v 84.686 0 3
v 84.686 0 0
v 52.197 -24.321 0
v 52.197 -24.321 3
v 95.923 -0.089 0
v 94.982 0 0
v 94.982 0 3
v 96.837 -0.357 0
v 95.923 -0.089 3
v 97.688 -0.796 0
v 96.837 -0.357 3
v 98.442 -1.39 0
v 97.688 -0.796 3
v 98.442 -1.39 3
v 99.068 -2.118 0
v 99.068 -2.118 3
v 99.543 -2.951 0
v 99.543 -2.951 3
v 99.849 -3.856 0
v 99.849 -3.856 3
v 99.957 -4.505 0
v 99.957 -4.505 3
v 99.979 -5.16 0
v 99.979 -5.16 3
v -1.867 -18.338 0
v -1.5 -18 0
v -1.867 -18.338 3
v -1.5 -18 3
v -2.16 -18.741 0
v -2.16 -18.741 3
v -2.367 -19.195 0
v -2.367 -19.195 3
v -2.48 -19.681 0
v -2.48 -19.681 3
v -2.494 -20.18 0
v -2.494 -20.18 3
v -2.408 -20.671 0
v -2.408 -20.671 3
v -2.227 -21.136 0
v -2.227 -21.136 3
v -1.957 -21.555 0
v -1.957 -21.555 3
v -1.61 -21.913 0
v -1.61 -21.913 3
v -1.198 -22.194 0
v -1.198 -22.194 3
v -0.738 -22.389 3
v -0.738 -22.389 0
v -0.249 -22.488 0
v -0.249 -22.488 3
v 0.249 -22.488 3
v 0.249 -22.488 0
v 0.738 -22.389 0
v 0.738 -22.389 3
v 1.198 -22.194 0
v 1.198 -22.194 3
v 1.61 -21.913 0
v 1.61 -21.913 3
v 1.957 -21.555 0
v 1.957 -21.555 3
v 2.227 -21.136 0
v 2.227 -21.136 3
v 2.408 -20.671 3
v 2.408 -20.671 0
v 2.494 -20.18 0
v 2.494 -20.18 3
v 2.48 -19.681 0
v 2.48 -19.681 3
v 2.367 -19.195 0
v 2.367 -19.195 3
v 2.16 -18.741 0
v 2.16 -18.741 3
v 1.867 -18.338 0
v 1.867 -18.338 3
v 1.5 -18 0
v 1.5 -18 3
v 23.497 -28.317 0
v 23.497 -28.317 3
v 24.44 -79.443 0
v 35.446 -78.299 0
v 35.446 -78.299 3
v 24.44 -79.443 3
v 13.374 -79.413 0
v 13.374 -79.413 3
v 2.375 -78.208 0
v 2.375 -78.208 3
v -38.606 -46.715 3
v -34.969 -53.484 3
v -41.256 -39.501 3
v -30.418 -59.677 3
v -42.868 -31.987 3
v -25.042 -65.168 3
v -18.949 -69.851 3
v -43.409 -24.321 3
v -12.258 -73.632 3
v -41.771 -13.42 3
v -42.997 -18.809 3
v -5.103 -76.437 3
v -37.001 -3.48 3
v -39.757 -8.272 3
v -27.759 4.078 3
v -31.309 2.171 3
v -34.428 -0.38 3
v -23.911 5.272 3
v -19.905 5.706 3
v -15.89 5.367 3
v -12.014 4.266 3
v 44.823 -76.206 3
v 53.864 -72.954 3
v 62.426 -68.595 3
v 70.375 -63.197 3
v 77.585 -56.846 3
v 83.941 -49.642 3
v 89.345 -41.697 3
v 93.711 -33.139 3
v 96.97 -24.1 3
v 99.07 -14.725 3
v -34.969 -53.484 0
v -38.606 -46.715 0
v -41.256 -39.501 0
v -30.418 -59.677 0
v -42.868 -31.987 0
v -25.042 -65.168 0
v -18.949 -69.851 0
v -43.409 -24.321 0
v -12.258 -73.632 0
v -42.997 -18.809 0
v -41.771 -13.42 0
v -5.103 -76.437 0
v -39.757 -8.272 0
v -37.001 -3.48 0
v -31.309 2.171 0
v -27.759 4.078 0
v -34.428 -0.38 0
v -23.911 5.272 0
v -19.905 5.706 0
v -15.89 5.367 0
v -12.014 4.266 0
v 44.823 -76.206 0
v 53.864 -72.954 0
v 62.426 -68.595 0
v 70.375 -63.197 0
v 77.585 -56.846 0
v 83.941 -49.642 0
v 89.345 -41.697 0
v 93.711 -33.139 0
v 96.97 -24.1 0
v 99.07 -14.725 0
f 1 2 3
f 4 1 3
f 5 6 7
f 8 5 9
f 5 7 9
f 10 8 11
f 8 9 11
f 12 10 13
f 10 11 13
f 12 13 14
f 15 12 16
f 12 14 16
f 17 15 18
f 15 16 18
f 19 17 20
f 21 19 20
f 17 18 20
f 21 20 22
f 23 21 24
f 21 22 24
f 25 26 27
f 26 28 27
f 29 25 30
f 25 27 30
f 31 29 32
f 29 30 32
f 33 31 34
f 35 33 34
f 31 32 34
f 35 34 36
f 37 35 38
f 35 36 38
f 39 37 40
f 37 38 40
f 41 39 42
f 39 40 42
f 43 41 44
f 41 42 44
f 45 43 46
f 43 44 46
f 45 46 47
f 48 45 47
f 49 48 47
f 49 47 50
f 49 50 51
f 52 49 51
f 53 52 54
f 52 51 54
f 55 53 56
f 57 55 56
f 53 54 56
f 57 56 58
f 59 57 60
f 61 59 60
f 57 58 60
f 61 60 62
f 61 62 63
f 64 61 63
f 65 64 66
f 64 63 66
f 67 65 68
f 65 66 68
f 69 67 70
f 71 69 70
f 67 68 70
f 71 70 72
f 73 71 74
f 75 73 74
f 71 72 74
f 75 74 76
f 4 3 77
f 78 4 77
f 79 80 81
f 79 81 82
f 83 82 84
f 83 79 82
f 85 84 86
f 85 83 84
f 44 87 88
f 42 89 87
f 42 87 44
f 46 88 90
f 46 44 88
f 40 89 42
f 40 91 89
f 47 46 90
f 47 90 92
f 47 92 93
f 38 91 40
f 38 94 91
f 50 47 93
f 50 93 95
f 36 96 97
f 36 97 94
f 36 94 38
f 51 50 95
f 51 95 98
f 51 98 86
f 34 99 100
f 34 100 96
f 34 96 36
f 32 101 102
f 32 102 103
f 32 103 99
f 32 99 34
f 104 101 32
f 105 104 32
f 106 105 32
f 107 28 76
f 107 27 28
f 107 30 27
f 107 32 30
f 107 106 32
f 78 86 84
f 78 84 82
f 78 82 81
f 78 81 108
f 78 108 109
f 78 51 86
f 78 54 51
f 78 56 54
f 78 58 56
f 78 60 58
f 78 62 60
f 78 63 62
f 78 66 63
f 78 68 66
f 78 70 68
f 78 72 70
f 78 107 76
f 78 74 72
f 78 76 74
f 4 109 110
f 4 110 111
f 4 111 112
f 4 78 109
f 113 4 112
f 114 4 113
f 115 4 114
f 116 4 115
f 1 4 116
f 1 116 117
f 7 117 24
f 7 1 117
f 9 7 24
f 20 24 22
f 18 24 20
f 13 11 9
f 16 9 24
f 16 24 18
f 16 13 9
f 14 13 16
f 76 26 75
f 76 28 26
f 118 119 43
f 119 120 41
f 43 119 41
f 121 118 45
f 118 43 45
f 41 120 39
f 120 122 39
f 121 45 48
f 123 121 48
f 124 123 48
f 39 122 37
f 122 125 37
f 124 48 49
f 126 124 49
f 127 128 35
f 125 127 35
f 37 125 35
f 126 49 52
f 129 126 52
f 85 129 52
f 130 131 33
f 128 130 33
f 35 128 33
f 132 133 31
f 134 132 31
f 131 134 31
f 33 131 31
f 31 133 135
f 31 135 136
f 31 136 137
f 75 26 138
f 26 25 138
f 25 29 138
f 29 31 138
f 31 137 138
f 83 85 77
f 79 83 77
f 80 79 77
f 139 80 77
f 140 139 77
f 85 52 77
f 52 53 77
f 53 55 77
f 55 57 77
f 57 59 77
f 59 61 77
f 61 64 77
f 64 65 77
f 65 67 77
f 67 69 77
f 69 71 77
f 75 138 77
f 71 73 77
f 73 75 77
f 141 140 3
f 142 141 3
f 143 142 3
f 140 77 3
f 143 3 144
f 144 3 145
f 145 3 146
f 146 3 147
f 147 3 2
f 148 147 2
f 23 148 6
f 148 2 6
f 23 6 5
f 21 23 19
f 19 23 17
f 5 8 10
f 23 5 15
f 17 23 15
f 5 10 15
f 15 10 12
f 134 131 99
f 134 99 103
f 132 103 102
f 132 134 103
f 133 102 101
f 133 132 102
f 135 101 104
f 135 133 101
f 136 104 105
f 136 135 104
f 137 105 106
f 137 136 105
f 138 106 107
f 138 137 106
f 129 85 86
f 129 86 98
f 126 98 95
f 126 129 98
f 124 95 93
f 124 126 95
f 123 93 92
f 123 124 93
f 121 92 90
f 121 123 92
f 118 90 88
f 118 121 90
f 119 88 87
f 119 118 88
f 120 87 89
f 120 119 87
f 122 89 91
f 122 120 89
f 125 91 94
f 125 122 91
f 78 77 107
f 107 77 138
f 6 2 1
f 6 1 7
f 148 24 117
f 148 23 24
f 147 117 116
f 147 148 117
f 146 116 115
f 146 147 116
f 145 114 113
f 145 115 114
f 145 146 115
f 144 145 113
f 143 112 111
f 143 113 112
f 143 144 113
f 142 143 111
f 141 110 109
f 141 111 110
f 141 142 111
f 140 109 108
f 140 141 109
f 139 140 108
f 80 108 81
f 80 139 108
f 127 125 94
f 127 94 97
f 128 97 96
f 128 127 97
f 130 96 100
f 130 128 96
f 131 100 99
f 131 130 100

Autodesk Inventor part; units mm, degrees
ref_plane "YZ Plane" through (0, 0, 0) normal (1, 0, 0) x (0, 1, 0)
ref_plane "XZ Plane" through (0, 0, 0) normal (0, 1, 0) x (-1, 0, 0)
ref_plane "XY Plane" through (0, 0, 0) normal (0, 0, 1) x (1, 0, 0)
sketch "Sketch1" plane through (0, 0, 0) normal (0, 0, 1) x (1, 0, 0)
  line L0 (0, 0) -> (100, 0)
  arc A0 (100.0128, -3.6299) -> (100, 0) centre (-17.3055, -2.2293) ccw
  arc A1 (35.4459, -78.2987) -> (100.0128, -3.6299) centre (23.4974, -2.7164) ccw
  arc A2 (2.3748, -78.2085) -> (35.4459, -78.2987) centre (19.1908, 24.5253) ccw
  arc A3 (-43.4089, -24.3214) -> (2.3748, -78.2085) centre (11.1953, -24.3214) ccw
  arc A4 (-37.0013, -3.4804) -> (-43.4089, -24.3214) centre (-6.3121, -24.3214) ccw
  line L1 (84.6864, 0) -> (52.1966, -24.3214)
  line L2 (52.1966, -24.3214) -> (23.4974, -28.3171)
  line L3 (23.4974, -28.3171) -> (-12.0135, 4.2661)
  arc A5 (-12.0135, 4.2661) -> (-37.0013, -3.4804) centre (-19.6547, -15.2605) ccw
  point P0 (3.9425, 17.9592)
  dimension "d14" = 100
extrude "Extrusion1" add sketch "Sketch1" along normal blind 3
sketch "Sketch2" plane through (0, 0, 3) normal (0, 0, 1) x (1, 0, 0)
  arc A0 (-1.5, -18) -> (1.5, -18) centre (0, -20) ccw
  line L0 (-1.5, -18) -> (1.5, -18)
  point P0 (0, 0)
  dimension "d5" = 5
  dimension "d6" = 20
  dimension "d7" = 2
extrude "Extrusion2" cut sketch "Sketch2" against normal blind 3
fillet "Fillet7" radius 5 1 edges at (100, 0, 1.5)
properties part number "cam3"
